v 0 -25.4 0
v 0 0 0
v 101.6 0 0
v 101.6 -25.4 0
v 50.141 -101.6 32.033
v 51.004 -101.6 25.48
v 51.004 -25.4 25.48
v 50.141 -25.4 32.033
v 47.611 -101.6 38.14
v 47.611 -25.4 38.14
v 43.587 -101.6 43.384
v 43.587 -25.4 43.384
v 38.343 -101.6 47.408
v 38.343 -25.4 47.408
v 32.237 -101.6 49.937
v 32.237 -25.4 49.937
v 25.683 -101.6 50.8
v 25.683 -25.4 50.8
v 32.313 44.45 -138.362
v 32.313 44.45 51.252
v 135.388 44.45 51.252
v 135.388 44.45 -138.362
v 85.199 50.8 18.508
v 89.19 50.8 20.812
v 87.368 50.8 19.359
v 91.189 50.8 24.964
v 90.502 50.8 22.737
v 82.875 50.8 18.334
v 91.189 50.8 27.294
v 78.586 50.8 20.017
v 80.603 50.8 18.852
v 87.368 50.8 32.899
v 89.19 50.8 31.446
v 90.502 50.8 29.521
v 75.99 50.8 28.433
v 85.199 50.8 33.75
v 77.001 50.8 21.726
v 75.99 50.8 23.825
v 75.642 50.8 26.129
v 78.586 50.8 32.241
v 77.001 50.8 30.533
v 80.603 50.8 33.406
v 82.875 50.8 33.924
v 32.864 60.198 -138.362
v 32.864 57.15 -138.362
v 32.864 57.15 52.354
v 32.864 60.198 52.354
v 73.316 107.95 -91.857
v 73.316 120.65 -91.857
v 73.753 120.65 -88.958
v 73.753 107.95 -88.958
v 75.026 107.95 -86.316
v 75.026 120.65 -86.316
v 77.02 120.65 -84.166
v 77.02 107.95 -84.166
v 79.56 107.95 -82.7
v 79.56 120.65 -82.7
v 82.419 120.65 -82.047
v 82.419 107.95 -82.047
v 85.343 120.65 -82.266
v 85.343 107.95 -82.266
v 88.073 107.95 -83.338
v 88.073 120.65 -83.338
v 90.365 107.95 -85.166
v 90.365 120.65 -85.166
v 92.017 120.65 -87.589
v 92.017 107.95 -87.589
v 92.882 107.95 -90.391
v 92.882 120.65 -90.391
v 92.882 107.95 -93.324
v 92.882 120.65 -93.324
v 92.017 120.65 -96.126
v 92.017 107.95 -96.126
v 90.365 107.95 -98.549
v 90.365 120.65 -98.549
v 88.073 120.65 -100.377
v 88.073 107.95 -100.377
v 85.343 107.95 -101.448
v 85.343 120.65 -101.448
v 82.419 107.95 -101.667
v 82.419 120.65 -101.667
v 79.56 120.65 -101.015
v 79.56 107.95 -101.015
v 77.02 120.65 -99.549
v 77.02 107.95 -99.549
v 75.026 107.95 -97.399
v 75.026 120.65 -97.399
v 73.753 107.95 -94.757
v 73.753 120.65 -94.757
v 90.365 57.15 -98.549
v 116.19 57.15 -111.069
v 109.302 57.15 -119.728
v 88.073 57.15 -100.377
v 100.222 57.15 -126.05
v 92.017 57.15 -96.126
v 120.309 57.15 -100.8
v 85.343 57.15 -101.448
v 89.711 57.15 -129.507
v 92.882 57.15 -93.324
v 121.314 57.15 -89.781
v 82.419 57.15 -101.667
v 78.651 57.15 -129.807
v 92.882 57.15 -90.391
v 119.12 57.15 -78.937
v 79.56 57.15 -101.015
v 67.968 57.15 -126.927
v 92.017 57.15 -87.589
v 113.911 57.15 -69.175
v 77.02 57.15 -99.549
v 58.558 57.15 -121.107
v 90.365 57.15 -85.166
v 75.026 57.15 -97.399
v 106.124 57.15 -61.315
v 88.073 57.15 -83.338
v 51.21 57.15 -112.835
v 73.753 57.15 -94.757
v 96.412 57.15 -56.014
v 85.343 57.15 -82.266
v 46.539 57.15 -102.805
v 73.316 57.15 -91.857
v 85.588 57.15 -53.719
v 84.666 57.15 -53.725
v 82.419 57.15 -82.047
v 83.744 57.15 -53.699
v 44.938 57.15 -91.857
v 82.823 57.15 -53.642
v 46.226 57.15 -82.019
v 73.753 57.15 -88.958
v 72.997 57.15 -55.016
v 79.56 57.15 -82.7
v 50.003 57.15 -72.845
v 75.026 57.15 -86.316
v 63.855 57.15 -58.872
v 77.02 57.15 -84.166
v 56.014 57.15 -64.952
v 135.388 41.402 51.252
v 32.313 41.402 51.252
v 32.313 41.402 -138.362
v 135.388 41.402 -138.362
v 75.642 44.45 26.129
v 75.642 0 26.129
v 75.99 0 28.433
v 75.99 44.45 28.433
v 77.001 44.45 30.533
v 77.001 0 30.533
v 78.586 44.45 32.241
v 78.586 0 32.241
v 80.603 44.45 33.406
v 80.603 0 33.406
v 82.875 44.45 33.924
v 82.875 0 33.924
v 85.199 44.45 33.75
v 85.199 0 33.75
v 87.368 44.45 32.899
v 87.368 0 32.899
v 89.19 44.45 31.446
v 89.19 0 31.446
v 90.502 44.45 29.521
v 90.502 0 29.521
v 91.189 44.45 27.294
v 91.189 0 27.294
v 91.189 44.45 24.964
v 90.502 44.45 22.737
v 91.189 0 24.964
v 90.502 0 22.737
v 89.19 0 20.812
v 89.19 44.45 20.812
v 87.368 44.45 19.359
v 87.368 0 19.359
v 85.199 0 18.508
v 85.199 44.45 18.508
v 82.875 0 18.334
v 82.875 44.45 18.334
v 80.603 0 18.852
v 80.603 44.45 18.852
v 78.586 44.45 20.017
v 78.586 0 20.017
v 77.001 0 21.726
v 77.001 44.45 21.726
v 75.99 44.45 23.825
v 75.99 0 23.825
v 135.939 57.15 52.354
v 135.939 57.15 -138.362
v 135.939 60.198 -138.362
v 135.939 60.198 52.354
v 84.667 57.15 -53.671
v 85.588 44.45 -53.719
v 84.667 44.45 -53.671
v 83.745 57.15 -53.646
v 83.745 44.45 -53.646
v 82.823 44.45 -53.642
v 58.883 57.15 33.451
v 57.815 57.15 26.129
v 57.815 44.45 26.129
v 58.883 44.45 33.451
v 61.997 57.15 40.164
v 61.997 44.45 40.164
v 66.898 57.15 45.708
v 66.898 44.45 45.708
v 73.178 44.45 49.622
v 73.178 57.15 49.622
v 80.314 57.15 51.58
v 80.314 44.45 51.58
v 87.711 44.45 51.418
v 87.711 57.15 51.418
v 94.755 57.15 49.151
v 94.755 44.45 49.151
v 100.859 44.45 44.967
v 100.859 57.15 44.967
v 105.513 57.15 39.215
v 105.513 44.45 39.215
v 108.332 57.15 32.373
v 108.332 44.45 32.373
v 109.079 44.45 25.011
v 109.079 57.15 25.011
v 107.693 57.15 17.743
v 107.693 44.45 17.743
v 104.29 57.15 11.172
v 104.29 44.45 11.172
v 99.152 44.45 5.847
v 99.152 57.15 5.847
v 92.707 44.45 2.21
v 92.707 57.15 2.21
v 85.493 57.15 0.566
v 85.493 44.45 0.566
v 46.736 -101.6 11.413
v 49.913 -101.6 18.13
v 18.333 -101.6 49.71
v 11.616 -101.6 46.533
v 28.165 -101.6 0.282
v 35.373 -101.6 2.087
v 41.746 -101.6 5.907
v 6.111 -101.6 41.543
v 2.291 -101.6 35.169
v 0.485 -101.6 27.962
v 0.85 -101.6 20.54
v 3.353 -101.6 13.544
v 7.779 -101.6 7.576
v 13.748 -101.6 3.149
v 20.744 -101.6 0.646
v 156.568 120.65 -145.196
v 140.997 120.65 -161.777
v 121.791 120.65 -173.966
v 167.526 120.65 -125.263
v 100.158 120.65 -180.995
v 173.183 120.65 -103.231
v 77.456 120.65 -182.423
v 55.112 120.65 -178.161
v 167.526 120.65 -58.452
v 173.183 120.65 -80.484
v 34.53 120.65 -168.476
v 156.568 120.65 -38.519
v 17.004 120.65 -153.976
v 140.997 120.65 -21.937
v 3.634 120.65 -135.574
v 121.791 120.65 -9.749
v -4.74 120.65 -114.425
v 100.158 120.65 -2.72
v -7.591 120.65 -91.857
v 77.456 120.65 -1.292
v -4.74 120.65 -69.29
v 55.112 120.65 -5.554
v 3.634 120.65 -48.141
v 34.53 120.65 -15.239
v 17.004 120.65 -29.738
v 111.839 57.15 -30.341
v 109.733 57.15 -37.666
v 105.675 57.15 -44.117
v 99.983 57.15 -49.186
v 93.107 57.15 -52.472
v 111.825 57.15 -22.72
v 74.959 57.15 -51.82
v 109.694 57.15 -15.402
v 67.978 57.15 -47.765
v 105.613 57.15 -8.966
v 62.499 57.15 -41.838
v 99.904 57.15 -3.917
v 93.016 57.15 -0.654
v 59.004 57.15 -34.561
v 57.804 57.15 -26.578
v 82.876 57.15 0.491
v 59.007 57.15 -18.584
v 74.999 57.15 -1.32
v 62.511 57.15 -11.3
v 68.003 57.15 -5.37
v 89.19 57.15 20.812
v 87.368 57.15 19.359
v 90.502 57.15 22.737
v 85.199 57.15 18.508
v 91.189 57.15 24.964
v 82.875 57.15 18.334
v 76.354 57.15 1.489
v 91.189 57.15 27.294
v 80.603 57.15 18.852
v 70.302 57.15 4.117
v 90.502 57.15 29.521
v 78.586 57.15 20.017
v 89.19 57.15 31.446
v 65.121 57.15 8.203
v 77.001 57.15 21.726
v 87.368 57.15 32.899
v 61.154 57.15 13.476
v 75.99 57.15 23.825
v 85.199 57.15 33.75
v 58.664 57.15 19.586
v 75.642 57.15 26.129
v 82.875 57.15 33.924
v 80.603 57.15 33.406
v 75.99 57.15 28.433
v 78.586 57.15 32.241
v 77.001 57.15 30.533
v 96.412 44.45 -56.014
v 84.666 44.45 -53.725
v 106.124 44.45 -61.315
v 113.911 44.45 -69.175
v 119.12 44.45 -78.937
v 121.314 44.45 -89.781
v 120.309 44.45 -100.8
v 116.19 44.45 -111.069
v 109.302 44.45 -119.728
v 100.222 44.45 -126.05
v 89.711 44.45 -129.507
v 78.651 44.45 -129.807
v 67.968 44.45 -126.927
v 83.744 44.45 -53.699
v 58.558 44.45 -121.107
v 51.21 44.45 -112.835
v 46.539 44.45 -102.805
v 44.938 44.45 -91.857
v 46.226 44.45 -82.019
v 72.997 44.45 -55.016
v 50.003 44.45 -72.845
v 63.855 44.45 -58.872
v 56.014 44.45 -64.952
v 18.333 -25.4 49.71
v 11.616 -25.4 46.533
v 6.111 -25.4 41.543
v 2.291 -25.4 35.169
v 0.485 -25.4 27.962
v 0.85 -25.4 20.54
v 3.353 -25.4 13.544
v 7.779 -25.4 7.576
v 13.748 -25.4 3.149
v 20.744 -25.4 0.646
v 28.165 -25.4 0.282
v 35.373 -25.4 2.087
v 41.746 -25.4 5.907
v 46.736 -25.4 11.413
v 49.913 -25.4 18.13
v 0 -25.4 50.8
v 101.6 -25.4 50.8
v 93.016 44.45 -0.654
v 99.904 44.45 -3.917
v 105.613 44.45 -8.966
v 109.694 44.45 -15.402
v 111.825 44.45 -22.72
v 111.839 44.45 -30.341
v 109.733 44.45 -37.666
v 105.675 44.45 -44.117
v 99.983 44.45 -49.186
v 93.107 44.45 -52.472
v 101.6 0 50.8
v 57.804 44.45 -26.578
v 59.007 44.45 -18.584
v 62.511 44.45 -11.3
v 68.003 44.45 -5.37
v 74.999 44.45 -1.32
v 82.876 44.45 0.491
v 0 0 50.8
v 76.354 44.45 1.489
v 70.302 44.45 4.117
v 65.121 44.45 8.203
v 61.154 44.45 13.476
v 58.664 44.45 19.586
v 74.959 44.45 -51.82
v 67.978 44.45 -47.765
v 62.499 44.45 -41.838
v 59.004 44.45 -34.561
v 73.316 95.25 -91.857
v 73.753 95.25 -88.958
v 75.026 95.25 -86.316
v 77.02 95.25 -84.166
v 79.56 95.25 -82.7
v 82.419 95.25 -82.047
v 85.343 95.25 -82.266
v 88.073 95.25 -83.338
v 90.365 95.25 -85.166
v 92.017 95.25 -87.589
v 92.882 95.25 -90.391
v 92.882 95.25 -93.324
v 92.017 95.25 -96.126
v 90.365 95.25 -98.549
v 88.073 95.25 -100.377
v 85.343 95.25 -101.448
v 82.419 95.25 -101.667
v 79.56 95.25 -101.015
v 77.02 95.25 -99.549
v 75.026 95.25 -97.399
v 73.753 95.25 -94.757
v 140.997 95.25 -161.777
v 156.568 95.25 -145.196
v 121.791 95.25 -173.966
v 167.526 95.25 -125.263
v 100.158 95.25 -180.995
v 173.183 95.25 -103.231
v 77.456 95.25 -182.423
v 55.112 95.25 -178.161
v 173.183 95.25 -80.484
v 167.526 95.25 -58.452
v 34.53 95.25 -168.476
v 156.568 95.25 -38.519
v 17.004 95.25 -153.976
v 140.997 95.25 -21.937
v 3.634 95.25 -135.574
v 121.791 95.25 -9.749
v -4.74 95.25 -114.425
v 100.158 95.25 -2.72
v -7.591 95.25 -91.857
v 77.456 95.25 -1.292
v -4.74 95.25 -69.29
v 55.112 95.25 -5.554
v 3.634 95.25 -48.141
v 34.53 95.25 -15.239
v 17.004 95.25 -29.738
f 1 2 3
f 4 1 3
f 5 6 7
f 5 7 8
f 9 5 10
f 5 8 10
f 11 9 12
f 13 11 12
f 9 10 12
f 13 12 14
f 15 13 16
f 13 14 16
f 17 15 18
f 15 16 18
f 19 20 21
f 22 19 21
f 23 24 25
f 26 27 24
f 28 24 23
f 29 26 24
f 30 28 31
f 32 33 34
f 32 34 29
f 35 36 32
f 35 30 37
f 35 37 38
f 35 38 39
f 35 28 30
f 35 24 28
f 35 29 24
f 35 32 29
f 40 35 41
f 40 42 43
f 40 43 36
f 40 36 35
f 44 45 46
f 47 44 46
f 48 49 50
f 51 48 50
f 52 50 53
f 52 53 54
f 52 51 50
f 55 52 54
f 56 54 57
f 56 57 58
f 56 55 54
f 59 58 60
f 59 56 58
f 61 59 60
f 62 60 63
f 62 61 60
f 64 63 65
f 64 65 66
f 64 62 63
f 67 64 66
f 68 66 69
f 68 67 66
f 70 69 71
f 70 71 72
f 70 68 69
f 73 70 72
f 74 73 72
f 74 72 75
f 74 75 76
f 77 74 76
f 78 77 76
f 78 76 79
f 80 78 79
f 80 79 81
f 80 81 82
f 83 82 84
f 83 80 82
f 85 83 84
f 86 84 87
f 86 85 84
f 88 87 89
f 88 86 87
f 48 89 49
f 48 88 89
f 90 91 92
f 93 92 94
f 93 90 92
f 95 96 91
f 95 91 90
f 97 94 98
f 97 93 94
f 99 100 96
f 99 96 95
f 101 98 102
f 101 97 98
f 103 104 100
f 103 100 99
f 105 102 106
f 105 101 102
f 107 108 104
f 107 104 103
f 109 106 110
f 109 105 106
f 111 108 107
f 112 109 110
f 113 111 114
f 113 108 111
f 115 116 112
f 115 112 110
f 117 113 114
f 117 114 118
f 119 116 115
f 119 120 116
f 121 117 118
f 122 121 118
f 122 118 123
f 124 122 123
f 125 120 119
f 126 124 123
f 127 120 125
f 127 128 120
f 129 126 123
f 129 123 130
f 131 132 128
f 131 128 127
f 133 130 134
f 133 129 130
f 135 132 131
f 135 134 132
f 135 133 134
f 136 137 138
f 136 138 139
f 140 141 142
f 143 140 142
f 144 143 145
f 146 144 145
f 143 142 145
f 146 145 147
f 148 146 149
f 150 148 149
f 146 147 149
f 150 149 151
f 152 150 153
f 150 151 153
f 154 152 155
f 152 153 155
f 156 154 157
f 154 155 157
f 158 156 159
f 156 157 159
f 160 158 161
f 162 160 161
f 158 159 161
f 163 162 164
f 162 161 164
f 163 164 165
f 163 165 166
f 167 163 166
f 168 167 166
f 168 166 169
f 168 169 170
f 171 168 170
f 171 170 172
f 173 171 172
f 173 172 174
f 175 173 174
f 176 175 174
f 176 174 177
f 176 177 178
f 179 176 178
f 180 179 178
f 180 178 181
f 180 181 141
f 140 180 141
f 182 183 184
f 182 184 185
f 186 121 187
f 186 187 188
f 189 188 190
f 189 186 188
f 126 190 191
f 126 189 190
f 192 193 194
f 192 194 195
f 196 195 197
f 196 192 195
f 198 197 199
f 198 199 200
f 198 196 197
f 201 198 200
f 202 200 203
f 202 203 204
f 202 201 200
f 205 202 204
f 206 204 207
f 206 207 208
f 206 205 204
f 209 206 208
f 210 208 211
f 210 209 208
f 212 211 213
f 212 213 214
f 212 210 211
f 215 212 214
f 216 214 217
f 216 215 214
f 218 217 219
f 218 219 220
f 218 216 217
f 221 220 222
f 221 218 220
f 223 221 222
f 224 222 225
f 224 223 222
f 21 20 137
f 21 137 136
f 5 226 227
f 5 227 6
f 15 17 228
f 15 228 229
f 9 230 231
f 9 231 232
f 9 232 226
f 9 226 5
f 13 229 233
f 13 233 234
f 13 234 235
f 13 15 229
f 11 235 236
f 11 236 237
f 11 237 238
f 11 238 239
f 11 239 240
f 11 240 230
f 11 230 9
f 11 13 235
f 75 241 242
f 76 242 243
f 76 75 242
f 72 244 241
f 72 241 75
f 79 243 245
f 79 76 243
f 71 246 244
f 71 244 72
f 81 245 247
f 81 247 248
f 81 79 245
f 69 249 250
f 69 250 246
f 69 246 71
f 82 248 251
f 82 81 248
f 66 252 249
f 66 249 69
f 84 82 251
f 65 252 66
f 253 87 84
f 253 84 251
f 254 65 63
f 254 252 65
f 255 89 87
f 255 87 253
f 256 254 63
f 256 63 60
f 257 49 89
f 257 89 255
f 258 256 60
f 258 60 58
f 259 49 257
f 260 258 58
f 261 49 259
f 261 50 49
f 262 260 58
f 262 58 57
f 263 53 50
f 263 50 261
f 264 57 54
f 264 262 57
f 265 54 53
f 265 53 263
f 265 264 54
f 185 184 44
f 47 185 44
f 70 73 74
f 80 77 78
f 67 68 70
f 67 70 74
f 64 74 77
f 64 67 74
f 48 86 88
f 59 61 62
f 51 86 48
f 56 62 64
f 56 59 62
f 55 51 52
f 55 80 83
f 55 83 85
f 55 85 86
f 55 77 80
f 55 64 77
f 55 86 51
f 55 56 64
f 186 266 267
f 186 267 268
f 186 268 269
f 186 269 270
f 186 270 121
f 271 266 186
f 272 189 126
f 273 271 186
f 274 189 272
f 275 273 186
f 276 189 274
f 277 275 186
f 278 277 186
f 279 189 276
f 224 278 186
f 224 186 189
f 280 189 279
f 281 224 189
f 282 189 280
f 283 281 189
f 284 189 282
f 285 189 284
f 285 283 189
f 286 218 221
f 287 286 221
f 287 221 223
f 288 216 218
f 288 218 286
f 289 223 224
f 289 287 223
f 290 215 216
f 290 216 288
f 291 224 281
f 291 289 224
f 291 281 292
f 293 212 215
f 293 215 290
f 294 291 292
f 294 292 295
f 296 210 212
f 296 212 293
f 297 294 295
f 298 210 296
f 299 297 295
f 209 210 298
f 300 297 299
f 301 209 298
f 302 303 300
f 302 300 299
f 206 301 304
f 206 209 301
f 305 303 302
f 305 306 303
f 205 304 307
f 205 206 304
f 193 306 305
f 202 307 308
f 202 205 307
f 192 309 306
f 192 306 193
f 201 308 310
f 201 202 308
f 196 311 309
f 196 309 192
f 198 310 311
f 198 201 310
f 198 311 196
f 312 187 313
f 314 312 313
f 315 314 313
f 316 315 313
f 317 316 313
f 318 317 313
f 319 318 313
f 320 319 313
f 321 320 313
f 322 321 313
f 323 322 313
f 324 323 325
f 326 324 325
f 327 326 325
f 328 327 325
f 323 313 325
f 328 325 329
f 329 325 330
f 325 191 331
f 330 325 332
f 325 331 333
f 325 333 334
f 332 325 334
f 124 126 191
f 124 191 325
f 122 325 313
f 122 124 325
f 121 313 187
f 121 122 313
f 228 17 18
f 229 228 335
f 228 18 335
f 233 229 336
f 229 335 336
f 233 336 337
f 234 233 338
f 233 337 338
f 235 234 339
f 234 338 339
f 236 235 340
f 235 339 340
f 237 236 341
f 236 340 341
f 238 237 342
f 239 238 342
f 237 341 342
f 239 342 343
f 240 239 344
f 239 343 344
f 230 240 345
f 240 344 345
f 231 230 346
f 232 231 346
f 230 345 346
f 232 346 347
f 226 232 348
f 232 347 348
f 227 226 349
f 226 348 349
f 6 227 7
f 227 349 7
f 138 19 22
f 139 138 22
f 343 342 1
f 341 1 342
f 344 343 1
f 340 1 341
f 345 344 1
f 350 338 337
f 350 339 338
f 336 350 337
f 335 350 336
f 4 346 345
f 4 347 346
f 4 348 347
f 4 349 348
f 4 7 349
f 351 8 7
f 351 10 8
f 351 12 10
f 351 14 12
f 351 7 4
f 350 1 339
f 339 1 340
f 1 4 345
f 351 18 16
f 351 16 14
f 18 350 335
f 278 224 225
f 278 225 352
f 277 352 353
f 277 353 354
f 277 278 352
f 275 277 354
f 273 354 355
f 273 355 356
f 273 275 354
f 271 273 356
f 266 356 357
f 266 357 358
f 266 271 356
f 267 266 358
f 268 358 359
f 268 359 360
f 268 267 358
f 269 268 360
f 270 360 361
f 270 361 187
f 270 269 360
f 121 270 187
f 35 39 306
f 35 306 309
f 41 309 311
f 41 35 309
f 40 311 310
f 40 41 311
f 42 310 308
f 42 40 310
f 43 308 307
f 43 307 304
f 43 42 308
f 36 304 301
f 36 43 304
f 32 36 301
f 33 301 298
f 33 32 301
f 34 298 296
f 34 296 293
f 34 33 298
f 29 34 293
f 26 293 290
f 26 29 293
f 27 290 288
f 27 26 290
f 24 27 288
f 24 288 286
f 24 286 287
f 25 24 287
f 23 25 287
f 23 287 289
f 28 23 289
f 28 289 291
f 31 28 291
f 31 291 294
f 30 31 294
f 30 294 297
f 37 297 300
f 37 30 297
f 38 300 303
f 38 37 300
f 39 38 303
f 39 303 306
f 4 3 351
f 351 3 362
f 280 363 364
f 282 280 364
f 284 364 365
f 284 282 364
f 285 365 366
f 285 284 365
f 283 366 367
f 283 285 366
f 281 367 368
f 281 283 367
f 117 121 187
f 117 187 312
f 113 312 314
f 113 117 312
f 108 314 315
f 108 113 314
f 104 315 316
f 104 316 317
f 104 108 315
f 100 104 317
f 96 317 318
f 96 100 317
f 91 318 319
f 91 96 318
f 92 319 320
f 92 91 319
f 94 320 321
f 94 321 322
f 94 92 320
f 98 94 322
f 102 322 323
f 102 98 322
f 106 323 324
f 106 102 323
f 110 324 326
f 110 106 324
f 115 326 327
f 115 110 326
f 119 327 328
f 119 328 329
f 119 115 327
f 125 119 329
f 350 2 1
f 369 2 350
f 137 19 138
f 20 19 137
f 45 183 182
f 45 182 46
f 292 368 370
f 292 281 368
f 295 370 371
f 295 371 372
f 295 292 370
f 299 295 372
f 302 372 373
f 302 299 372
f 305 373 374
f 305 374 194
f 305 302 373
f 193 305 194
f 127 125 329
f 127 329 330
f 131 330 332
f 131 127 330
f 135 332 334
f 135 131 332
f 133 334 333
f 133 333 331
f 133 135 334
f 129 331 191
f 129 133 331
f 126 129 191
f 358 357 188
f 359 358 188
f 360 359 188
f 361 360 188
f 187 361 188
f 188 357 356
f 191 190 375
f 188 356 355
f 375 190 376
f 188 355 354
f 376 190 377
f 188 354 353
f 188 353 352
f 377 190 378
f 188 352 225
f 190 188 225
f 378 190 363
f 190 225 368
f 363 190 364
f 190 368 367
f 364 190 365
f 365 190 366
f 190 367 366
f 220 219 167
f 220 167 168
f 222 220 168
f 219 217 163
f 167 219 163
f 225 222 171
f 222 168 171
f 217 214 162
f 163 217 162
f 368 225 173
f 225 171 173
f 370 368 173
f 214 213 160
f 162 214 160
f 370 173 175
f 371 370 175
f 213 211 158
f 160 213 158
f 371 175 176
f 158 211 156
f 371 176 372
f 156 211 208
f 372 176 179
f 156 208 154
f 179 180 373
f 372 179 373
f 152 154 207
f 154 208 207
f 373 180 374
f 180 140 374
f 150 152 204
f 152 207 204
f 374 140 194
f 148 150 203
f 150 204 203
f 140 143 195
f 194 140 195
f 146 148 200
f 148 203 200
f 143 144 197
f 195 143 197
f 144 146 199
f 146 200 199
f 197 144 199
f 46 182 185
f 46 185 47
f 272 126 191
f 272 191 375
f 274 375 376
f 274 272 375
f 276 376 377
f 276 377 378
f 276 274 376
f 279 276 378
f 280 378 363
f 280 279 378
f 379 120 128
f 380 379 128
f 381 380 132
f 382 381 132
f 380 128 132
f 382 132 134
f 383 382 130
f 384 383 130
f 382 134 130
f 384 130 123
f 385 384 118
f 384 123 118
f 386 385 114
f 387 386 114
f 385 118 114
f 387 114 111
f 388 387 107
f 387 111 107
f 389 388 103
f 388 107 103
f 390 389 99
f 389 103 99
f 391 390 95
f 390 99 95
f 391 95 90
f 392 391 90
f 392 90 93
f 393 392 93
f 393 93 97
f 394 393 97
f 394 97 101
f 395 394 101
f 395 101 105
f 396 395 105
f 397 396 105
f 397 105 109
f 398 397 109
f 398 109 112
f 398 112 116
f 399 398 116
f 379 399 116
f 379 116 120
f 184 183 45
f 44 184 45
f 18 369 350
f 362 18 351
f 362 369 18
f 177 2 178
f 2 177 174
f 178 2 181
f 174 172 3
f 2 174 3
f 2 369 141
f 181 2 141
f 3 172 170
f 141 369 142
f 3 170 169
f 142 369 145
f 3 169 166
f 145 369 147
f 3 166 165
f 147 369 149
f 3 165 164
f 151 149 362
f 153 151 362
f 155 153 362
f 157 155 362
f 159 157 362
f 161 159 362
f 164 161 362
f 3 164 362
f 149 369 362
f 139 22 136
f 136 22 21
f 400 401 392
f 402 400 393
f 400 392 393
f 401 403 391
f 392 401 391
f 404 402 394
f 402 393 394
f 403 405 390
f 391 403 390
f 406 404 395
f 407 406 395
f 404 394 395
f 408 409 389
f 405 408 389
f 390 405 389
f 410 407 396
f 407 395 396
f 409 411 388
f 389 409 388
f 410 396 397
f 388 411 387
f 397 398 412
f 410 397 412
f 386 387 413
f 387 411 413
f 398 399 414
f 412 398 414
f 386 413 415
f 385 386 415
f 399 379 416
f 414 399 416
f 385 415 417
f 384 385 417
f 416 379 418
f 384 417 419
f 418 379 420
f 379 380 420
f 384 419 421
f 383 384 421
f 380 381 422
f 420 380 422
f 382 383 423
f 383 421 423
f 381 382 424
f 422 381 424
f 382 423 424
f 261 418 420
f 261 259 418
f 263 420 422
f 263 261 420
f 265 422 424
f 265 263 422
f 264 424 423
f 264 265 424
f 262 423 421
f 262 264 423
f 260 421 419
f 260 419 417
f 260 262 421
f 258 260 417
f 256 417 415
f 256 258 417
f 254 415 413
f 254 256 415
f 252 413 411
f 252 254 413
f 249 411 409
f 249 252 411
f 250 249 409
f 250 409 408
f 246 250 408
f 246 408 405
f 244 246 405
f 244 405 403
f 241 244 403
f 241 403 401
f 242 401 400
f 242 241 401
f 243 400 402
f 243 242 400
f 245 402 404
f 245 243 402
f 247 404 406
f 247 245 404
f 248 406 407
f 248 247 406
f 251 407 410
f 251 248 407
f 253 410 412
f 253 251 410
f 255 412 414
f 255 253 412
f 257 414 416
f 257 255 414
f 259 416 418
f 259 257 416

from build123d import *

# Parameters (mm, degrees)
F0_W      = 101.6
F0_H      = 50.8
F1_DEPTH  = 25.4
F3_DEPTH  = 76.2
F4_R      = 7.8170204451
F5_DEPTH  = 50.8
F6_R      = 25.644207128
F6_R_2    = 7.8170204451
F7_DEPTH  = 6.35
F9_DEPTH  = 12.7
F10_R     = 9.8375849935
F11_DEPTH = 50.8
F12_R     = 90.7447229993
F12_R_2   = 9.8375849935
F13_DEPTH = 12.7
F14_W     = 103.0746027827
F14_H     = 190.7155923545
F14_R     = 7.8170204451
F15_DEPTH = 3.048
F16_W     = 103.0746139586
F16_H     = 189.613185823
F17_DEPTH = 3.048


with BuildPart() as f1:
    # F0 (on Front) → F1 (new body)
    with BuildSketch(Plane.XZ):
        with Locations((50.8, 25.4)):
            Rectangle(F0_W, F0_H)
    extrude(amount=F1_DEPTH)

    # F2 (on face) → F3 (join)
    with BuildSketch(Plane.XZ.offset(25.4)):
        with BuildLine():
            ThreePointArc((25.6833657622, 50.8), (7.7793208604, 7.5758119767), (51.0035088837, 25.4798568785))
            ThreePointArc((51.0035088837, 25.4798568785), (43.587410664, 43.3839017803), (25.6833657622, 50.8))
        make_face()
    extrude(amount=F3_DEPTH)

    # F4 (on face) → F5 (join)
    with BuildSketch(Plane(origin=(0, 0, 0), x_dir=(-1, 0, 0), z_dir=(0, 1, 0))):
        with Locations((-83.4593474865, 26.1290259659)):
            Circle(F4_R)
    extrude(amount=F5_DEPTH)

    # F6 (on face) → F7 (join, symmetric)
    with BuildSketch(Plane(origin=(0, 50.8, 0), x_dir=(-1, 0, 0), z_dir=(0, 1, 0))):
        with Locations((-83.4593474865, 26.1290259659)):
            Circle(F6_R)
        with Locations((-83.4593474865, 26.1290259659)):
            Circle(F6_R_2, mode=Mode.SUBTRACT)
    extrude(amount=F7_DEPTH, both=True)

    # F8 (on face) → F9 (join)
    with BuildSketch(Plane(origin=(0, 57.15, 0), x_dir=(-1, 0, 0), z_dir=(0, 1, 0))):
        with BuildLine():
            ThreePointArc((-82.8231419789, -53.6424991385), (-65.0168964585, -45.0063215529), (-57.8038766465, -26.5775861645))
            ThreePointArc((-57.8038766465, -26.5775861645), (-65.0349730844, -8.1293153727), (-82.8762134984, 0.4914497549))
            ThreePointArc((-82.8762134984, 0.4914497549), (-84.1855044396, 0.4951020505), (-85.4929024808, 0.5655752343))
            ThreePointArc((-85.4929024808, 0.5655752343), (-112.1009188319, -26.5299215531), (-85.588209331, -53.7186823785))
            ThreePointArc((-85.588209331, -53.7186823785), (-84.2063651548, -53.6555653942), (-82.8231419789, -53.6424991385))
        make_face()
    extrude(amount=-F9_DEPTH)

    # F8 (on face) → F9, piece 2 (join)
    with BuildSketch(Plane(origin=(0, 57.15, 0), x_dir=(-1, 0, 0), z_dir=(0, 1, 0))):
        with BuildLine():
            ThreePointArc((-44.9375776675, -91.8573196977), (-56.0141948455, -64.9515187732), (-82.8231419789, -53.6424991385))
            ThreePointArc((-82.8231419789, -53.6424991385), (-84.2047047528, -53.7158296115), (-85.588209331, -53.7186823785))
            ThreePointArc((-85.588209331, -53.7186823785), (-109.3019548476, -119.7276870761), (-44.9375776675, -91.8573196977))
        make_face()
    extrude(amount=-F9_DEPTH)

    # F10 (on face) → F11 (join)
    with BuildSketch(Plane(origin=(0, 57.15, 0), x_dir=(-1, 0, 0), z_dir=(0, 1, 0))):
        with Locations((-83.1538289785, -91.8573196977)):
            Circle(F10_R)
    extrude(amount=F11_DEPTH)

    # F12 (on face) → F13 (join, symmetric)
    with BuildSketch(Plane(origin=(0, 107.95, 0), x_dir=(-1, 0, 0), z_dir=(0, 1, 0))):
        with Locations((-83.1538289785, -91.8573196977)):
            Circle(F12_R)
        with Locations((-83.1538289785, -91.8573196977)):
            Circle(F12_R_2, mode=Mode.SUBTRACT)
    extrude(amount=F13_DEPTH, both=True)


with BuildPart() as f15:
    # F14 (on face) → F15 (new body)
    with BuildSketch(Plane(origin=(0, 57.15, 0), x_dir=(-1, 0, 0), z_dir=(0, 1, 0))):
        with Locations((-84.4017453492, -43.0038068444)):
            Rectangle(F14_W, F14_H)
        with BuildLine():
            ThreePointArc((-85.4929024808, 0.5655752343), (-100.8587218107, 44.9674742129), (-57.8151403585, 26.1290259659))
            ThreePointArc((-57.8151403585, 26.1290259659), (-65.1211446302, 8.2031877645), (-82.8762134984, 0.4914497549))
            ThreePointArc((-82.8762134984, 0.4914497549), (-57.8038896932, -26.5509704508), (-82.8231419789, -53.6424991385))
            ThreePointArc((-82.8231419789, -53.6424991385), (-84.2063651548, -53.6555653942), (-85.588209331, -53.7186823785))
            ThreePointArc((-85.588209331, -53.7186823785), (-112.1009188319, -26.5299215531), (-85.4929024808, 0.5655752343))
        make_face(mode=Mode.SUBTRACT)
        with BuildLine():
            ThreePointArc((-82.8762134984, 0.4914497549), (-65.1211446302, 8.2031877645), (-57.8151403585, 26.1290259659))
            ThreePointArc((-57.8151403585, 26.1290259659), (-100.8587218107, 44.9674742129), (-85.4929024808, 0.5655752343))
            ThreePointArc((-85.4929024808, 0.5655752343), (-112.1009188319, -26.5299215531), (-85.588209331, -53.7186823785))
            ThreePointArc((-85.588209331, -53.7186823785), (-84.2063651548, -53.6555653942), (-82.8231419789, -53.6424991385))
            ThreePointArc((-82.8231419789, -53.6424991385), (-57.8038896932, -26.5509704508), (-82.8762134984, 0.4914497549))
        make_face()
        with Locations((-83.4593474865, 26.1290259659)):
            Circle(F14_R, mode=Mode.SUBTRACT)
        with Locations((-83.4593474865, 26.1290259659)):
            Circle(F14_R)
    extrude(amount=F15_DEPTH)


with BuildPart() as f17:
    # F16 (on face) → F17 (new body)
    with BuildSketch(Plane.XZ.offset(-44.45)):
        with Locations((83.8505458087, -43.5550101101)):
            Rectangle(F16_W, F16_H)
        with BuildLine():
            ThreePointArc((44.9375776675, -91.8573196977), (56.0141948455, -64.9515187732), (82.8231419789, -53.6424991385))
            ThreePointArc((82.8231419789, -53.6424991385), (84.2047047528, -53.7158296115), (85.588209331, -53.7186823785))
            ThreePointArc((85.588209331, -53.7186823785), (109.3019548476, -119.7276870761), (44.9375776675, -91.8573196977))
        make_face(mode=Mode.SUBTRACT)
        with BuildLine():
            ThreePointArc((85.588209331, -53.7186823785), (84.2047047528, -53.7158296115), (82.8231419789, -53.6424991385))
            ThreePointArc((82.8231419789, -53.6424991385), (56.0141948455, -64.9515187732), (44.9375776675, -91.8573196977))
            ThreePointArc((44.9375776675, -91.8573196977), (109.3019548476, -119.7276870761), (85.588209331, -53.7186823785))
        make_face()
    extrude(amount=F17_DEPTH)


solid = Compound([f1.part, f15.part, f17.part])
